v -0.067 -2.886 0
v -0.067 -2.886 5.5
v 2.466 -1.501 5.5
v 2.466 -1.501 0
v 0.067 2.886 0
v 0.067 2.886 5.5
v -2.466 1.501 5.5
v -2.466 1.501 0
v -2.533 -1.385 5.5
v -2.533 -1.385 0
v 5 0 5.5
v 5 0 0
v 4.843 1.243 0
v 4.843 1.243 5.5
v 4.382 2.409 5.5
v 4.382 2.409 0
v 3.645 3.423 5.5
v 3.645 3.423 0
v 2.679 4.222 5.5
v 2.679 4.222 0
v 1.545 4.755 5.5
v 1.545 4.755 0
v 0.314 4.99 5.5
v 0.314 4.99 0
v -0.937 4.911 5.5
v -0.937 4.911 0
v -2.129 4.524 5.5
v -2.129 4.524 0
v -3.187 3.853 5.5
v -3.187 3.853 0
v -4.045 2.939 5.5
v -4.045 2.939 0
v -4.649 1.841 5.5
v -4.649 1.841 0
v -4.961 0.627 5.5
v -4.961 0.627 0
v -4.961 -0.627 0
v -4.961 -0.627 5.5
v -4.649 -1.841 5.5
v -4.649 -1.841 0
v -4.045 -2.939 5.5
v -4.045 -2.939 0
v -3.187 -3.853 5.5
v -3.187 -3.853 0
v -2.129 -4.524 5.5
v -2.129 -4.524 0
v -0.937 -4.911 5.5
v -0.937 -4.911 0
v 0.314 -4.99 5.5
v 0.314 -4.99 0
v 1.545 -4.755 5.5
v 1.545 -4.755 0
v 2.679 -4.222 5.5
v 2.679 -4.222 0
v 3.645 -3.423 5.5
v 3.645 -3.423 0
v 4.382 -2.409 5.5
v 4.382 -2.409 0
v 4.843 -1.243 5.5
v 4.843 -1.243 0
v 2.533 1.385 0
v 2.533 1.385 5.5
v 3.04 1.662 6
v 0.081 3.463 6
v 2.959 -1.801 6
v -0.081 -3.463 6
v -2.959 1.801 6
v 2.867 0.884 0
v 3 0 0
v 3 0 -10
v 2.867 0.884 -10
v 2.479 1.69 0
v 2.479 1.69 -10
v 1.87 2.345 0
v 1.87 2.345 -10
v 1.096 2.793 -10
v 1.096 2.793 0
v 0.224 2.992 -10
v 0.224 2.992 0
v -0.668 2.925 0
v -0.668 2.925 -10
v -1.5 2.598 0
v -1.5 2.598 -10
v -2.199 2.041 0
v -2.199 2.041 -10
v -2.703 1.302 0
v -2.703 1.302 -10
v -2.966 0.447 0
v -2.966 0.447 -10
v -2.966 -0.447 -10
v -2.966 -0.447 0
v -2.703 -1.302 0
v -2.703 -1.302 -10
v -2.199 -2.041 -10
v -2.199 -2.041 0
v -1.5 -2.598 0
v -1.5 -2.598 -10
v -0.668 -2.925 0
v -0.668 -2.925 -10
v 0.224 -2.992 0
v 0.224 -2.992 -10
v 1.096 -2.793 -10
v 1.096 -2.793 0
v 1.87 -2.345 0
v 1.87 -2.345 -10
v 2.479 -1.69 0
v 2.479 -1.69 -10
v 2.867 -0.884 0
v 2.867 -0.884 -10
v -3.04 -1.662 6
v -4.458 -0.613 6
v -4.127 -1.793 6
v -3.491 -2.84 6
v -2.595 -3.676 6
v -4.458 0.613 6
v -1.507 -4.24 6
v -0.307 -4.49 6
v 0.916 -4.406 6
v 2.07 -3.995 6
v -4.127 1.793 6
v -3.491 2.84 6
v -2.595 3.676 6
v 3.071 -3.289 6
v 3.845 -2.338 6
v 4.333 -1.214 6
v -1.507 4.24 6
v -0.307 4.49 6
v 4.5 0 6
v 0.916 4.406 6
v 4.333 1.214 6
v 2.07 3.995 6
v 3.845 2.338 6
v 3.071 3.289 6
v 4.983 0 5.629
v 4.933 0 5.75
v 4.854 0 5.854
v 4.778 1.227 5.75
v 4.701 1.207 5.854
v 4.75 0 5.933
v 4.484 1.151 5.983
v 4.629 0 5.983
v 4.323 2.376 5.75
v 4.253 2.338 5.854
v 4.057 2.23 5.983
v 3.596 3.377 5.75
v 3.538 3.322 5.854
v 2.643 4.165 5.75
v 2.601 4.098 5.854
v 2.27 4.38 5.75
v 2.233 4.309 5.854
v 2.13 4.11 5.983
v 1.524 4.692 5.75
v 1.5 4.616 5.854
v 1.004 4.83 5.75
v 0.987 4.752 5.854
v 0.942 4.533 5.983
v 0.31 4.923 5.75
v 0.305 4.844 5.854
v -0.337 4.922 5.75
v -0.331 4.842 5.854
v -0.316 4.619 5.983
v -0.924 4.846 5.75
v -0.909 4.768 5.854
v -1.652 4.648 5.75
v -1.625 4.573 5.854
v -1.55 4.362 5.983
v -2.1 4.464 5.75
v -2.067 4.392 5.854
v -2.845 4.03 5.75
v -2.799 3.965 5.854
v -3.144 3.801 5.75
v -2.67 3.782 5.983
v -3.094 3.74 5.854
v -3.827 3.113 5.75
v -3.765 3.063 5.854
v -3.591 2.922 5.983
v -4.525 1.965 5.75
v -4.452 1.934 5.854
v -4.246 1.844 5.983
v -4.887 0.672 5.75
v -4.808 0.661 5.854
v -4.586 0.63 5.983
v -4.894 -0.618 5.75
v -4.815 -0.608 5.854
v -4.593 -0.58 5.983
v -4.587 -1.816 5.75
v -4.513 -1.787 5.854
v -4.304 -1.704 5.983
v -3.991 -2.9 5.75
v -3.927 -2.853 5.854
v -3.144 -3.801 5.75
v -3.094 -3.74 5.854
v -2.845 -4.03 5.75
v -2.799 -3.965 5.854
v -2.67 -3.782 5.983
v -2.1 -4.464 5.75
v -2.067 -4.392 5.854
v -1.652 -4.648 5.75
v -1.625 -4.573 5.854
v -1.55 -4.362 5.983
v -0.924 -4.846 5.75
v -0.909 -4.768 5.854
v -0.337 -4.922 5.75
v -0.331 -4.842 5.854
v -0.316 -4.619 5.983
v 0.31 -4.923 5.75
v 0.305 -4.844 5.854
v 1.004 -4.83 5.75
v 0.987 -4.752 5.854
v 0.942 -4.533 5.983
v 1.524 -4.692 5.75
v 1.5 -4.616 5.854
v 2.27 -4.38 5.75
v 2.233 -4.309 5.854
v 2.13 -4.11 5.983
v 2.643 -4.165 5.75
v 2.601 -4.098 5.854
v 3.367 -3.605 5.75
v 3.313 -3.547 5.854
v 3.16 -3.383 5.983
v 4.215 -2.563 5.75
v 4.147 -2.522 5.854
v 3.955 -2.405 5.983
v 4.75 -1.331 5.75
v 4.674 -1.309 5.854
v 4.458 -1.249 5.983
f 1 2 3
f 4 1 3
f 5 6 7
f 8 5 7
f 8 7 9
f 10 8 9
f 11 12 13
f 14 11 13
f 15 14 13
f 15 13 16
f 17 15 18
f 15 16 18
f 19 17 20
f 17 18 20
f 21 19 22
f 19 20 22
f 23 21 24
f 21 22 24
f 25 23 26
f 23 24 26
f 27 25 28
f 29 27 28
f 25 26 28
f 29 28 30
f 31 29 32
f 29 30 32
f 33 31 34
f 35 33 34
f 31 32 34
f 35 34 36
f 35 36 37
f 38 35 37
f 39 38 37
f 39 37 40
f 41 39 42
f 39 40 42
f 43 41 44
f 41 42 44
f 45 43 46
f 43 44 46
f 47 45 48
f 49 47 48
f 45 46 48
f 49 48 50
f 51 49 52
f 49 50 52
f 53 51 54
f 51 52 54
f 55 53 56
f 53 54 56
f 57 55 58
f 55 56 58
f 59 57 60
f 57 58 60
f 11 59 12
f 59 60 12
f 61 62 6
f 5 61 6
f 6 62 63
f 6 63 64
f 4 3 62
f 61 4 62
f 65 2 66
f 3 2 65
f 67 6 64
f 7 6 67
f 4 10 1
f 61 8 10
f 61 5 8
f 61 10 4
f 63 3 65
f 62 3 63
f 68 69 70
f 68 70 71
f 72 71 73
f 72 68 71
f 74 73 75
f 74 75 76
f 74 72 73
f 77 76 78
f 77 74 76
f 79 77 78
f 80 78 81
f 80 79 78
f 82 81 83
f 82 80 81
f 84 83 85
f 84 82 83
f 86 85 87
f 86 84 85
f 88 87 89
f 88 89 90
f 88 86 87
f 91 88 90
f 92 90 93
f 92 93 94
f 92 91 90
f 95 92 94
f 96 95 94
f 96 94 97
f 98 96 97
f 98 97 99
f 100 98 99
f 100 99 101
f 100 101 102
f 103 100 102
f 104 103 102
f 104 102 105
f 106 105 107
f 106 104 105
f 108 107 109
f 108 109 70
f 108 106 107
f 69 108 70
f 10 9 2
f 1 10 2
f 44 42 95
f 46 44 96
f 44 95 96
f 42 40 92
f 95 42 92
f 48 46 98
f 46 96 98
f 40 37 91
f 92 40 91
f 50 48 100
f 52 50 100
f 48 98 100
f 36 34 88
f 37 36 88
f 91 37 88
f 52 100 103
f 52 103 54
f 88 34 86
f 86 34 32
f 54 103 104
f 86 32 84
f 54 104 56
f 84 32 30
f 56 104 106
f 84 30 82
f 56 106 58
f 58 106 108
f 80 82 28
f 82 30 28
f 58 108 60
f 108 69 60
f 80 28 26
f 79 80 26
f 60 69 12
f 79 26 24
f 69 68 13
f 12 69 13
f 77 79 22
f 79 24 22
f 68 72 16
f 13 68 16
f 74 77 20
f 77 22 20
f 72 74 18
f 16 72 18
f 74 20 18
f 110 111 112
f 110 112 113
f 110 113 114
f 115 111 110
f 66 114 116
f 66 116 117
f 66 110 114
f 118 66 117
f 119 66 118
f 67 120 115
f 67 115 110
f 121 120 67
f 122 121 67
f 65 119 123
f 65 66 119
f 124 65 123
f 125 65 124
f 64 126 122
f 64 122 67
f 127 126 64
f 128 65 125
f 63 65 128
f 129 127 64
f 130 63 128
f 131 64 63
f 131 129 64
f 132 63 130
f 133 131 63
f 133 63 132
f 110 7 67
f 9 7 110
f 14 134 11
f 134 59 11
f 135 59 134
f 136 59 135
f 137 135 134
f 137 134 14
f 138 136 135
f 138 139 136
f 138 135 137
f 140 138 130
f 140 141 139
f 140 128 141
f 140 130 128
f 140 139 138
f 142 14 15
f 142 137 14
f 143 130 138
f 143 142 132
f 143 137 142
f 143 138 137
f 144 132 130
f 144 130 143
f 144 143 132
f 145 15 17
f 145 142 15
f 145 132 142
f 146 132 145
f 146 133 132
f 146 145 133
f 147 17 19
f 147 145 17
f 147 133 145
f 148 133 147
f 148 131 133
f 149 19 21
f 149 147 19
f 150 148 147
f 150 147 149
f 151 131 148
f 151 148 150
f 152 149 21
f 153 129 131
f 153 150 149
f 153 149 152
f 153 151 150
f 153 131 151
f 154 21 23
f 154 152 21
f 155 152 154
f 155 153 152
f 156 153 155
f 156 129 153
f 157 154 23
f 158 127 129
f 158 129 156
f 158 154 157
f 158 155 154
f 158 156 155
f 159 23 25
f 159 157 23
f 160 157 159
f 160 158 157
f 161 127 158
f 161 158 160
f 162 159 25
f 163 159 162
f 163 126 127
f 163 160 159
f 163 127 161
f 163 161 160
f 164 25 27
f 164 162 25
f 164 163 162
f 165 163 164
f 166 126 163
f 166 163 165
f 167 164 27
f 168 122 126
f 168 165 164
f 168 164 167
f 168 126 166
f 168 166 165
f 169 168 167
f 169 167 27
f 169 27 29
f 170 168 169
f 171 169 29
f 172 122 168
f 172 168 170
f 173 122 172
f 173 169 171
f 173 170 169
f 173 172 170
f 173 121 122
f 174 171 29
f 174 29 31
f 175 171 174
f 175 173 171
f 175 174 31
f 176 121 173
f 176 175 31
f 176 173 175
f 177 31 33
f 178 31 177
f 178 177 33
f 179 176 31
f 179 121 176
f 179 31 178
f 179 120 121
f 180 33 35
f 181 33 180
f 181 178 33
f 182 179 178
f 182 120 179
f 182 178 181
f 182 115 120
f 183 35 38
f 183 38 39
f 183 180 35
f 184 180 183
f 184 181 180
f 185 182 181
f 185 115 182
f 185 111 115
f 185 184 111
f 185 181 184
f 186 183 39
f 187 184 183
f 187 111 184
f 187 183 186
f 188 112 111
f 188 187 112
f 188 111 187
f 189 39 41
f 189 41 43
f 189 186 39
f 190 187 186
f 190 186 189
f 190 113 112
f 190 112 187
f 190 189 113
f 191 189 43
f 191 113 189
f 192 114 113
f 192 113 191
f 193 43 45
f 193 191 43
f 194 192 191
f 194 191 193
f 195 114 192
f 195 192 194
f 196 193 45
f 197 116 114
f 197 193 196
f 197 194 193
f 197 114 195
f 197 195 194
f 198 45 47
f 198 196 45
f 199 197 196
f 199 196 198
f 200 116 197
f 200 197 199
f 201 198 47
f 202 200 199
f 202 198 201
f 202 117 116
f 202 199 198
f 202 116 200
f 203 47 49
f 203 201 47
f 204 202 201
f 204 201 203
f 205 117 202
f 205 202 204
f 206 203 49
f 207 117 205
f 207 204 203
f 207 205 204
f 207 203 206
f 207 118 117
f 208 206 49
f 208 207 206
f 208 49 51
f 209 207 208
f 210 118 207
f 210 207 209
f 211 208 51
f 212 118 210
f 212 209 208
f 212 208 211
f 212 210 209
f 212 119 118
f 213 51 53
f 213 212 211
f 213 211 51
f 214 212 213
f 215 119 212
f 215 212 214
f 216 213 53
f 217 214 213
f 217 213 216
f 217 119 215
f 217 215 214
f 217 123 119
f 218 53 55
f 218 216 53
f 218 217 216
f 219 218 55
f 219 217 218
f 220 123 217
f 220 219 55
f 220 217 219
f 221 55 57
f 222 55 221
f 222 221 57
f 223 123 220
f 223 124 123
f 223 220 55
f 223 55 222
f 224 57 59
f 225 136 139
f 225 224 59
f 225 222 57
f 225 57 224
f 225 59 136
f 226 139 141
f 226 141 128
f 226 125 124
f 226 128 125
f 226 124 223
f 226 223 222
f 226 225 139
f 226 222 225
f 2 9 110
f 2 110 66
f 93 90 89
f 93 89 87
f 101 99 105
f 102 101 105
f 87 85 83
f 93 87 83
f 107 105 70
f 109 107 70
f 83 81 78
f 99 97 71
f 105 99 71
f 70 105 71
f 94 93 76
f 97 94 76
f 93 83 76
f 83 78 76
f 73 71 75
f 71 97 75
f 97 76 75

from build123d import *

# Parameters (mm, degrees)
SKETCH2_R          = 3
EXTRUDE1_DEPTH     = 10
SKETCH3_R          = 5
EXTRUDE2_DEPTH     = 6
CUT_EXTRUDE1_DEPTH = 6
FILLET1_R          = 0.5
CHAMFER1_SIZE      = 0.5


with BuildPart() as part:
    # Sketch2 → Extrude1 (new body)
    with BuildSketch(Plane.XY):
        Circle(SKETCH2_R)
    extrude(amount=-EXTRUDE1_DEPTH)

    # Sketch3 → Extrude2 (add)
    with BuildSketch(Plane.XY):
        Circle(SKETCH3_R)
    extrude(amount=EXTRUDE2_DEPTH)

    # Sketch4 → Cut-Extrude1 (cut)
    with BuildSketch(Plane.XY.offset(6)):
        Polygon((-2.46568884, 1.501236783), (-2.532953611, -1.384730781), (-0.067264771, -2.885967565), (2.46568884, -1.501236783), (2.532953611, 1.384730781), (0.067264771, 2.885967565), align=None)
    extrude(amount=-CUT_EXTRUDE1_DEPTH, mode=Mode.SUBTRACT)

    # Fillet1
    fillet1_edges = [part.edges().sort_by_distance(p)[0] for p in [
        (-5, 0, 6),
    ]]
    fillet(fillet1_edges, radius=FILLET1_R)

    # Chamfer1
    chamfer1_edges = [part.edges().sort_by_distance(p)[0] for p in [
        (-1.199212034, 2.193602174, 6),
        (-2.499321225, 0.058253001, 6),
        (-1.300109191, -2.135349173, 6),
        (1.199212034, -2.193602174, 6),
        (2.499321225, -0.058253001, 6),
        (1.300109191, 2.135349173, 6),
    ]]
    chamfer(chamfer1_edges, length=CHAMFER1_SIZE)


solid = part.part
